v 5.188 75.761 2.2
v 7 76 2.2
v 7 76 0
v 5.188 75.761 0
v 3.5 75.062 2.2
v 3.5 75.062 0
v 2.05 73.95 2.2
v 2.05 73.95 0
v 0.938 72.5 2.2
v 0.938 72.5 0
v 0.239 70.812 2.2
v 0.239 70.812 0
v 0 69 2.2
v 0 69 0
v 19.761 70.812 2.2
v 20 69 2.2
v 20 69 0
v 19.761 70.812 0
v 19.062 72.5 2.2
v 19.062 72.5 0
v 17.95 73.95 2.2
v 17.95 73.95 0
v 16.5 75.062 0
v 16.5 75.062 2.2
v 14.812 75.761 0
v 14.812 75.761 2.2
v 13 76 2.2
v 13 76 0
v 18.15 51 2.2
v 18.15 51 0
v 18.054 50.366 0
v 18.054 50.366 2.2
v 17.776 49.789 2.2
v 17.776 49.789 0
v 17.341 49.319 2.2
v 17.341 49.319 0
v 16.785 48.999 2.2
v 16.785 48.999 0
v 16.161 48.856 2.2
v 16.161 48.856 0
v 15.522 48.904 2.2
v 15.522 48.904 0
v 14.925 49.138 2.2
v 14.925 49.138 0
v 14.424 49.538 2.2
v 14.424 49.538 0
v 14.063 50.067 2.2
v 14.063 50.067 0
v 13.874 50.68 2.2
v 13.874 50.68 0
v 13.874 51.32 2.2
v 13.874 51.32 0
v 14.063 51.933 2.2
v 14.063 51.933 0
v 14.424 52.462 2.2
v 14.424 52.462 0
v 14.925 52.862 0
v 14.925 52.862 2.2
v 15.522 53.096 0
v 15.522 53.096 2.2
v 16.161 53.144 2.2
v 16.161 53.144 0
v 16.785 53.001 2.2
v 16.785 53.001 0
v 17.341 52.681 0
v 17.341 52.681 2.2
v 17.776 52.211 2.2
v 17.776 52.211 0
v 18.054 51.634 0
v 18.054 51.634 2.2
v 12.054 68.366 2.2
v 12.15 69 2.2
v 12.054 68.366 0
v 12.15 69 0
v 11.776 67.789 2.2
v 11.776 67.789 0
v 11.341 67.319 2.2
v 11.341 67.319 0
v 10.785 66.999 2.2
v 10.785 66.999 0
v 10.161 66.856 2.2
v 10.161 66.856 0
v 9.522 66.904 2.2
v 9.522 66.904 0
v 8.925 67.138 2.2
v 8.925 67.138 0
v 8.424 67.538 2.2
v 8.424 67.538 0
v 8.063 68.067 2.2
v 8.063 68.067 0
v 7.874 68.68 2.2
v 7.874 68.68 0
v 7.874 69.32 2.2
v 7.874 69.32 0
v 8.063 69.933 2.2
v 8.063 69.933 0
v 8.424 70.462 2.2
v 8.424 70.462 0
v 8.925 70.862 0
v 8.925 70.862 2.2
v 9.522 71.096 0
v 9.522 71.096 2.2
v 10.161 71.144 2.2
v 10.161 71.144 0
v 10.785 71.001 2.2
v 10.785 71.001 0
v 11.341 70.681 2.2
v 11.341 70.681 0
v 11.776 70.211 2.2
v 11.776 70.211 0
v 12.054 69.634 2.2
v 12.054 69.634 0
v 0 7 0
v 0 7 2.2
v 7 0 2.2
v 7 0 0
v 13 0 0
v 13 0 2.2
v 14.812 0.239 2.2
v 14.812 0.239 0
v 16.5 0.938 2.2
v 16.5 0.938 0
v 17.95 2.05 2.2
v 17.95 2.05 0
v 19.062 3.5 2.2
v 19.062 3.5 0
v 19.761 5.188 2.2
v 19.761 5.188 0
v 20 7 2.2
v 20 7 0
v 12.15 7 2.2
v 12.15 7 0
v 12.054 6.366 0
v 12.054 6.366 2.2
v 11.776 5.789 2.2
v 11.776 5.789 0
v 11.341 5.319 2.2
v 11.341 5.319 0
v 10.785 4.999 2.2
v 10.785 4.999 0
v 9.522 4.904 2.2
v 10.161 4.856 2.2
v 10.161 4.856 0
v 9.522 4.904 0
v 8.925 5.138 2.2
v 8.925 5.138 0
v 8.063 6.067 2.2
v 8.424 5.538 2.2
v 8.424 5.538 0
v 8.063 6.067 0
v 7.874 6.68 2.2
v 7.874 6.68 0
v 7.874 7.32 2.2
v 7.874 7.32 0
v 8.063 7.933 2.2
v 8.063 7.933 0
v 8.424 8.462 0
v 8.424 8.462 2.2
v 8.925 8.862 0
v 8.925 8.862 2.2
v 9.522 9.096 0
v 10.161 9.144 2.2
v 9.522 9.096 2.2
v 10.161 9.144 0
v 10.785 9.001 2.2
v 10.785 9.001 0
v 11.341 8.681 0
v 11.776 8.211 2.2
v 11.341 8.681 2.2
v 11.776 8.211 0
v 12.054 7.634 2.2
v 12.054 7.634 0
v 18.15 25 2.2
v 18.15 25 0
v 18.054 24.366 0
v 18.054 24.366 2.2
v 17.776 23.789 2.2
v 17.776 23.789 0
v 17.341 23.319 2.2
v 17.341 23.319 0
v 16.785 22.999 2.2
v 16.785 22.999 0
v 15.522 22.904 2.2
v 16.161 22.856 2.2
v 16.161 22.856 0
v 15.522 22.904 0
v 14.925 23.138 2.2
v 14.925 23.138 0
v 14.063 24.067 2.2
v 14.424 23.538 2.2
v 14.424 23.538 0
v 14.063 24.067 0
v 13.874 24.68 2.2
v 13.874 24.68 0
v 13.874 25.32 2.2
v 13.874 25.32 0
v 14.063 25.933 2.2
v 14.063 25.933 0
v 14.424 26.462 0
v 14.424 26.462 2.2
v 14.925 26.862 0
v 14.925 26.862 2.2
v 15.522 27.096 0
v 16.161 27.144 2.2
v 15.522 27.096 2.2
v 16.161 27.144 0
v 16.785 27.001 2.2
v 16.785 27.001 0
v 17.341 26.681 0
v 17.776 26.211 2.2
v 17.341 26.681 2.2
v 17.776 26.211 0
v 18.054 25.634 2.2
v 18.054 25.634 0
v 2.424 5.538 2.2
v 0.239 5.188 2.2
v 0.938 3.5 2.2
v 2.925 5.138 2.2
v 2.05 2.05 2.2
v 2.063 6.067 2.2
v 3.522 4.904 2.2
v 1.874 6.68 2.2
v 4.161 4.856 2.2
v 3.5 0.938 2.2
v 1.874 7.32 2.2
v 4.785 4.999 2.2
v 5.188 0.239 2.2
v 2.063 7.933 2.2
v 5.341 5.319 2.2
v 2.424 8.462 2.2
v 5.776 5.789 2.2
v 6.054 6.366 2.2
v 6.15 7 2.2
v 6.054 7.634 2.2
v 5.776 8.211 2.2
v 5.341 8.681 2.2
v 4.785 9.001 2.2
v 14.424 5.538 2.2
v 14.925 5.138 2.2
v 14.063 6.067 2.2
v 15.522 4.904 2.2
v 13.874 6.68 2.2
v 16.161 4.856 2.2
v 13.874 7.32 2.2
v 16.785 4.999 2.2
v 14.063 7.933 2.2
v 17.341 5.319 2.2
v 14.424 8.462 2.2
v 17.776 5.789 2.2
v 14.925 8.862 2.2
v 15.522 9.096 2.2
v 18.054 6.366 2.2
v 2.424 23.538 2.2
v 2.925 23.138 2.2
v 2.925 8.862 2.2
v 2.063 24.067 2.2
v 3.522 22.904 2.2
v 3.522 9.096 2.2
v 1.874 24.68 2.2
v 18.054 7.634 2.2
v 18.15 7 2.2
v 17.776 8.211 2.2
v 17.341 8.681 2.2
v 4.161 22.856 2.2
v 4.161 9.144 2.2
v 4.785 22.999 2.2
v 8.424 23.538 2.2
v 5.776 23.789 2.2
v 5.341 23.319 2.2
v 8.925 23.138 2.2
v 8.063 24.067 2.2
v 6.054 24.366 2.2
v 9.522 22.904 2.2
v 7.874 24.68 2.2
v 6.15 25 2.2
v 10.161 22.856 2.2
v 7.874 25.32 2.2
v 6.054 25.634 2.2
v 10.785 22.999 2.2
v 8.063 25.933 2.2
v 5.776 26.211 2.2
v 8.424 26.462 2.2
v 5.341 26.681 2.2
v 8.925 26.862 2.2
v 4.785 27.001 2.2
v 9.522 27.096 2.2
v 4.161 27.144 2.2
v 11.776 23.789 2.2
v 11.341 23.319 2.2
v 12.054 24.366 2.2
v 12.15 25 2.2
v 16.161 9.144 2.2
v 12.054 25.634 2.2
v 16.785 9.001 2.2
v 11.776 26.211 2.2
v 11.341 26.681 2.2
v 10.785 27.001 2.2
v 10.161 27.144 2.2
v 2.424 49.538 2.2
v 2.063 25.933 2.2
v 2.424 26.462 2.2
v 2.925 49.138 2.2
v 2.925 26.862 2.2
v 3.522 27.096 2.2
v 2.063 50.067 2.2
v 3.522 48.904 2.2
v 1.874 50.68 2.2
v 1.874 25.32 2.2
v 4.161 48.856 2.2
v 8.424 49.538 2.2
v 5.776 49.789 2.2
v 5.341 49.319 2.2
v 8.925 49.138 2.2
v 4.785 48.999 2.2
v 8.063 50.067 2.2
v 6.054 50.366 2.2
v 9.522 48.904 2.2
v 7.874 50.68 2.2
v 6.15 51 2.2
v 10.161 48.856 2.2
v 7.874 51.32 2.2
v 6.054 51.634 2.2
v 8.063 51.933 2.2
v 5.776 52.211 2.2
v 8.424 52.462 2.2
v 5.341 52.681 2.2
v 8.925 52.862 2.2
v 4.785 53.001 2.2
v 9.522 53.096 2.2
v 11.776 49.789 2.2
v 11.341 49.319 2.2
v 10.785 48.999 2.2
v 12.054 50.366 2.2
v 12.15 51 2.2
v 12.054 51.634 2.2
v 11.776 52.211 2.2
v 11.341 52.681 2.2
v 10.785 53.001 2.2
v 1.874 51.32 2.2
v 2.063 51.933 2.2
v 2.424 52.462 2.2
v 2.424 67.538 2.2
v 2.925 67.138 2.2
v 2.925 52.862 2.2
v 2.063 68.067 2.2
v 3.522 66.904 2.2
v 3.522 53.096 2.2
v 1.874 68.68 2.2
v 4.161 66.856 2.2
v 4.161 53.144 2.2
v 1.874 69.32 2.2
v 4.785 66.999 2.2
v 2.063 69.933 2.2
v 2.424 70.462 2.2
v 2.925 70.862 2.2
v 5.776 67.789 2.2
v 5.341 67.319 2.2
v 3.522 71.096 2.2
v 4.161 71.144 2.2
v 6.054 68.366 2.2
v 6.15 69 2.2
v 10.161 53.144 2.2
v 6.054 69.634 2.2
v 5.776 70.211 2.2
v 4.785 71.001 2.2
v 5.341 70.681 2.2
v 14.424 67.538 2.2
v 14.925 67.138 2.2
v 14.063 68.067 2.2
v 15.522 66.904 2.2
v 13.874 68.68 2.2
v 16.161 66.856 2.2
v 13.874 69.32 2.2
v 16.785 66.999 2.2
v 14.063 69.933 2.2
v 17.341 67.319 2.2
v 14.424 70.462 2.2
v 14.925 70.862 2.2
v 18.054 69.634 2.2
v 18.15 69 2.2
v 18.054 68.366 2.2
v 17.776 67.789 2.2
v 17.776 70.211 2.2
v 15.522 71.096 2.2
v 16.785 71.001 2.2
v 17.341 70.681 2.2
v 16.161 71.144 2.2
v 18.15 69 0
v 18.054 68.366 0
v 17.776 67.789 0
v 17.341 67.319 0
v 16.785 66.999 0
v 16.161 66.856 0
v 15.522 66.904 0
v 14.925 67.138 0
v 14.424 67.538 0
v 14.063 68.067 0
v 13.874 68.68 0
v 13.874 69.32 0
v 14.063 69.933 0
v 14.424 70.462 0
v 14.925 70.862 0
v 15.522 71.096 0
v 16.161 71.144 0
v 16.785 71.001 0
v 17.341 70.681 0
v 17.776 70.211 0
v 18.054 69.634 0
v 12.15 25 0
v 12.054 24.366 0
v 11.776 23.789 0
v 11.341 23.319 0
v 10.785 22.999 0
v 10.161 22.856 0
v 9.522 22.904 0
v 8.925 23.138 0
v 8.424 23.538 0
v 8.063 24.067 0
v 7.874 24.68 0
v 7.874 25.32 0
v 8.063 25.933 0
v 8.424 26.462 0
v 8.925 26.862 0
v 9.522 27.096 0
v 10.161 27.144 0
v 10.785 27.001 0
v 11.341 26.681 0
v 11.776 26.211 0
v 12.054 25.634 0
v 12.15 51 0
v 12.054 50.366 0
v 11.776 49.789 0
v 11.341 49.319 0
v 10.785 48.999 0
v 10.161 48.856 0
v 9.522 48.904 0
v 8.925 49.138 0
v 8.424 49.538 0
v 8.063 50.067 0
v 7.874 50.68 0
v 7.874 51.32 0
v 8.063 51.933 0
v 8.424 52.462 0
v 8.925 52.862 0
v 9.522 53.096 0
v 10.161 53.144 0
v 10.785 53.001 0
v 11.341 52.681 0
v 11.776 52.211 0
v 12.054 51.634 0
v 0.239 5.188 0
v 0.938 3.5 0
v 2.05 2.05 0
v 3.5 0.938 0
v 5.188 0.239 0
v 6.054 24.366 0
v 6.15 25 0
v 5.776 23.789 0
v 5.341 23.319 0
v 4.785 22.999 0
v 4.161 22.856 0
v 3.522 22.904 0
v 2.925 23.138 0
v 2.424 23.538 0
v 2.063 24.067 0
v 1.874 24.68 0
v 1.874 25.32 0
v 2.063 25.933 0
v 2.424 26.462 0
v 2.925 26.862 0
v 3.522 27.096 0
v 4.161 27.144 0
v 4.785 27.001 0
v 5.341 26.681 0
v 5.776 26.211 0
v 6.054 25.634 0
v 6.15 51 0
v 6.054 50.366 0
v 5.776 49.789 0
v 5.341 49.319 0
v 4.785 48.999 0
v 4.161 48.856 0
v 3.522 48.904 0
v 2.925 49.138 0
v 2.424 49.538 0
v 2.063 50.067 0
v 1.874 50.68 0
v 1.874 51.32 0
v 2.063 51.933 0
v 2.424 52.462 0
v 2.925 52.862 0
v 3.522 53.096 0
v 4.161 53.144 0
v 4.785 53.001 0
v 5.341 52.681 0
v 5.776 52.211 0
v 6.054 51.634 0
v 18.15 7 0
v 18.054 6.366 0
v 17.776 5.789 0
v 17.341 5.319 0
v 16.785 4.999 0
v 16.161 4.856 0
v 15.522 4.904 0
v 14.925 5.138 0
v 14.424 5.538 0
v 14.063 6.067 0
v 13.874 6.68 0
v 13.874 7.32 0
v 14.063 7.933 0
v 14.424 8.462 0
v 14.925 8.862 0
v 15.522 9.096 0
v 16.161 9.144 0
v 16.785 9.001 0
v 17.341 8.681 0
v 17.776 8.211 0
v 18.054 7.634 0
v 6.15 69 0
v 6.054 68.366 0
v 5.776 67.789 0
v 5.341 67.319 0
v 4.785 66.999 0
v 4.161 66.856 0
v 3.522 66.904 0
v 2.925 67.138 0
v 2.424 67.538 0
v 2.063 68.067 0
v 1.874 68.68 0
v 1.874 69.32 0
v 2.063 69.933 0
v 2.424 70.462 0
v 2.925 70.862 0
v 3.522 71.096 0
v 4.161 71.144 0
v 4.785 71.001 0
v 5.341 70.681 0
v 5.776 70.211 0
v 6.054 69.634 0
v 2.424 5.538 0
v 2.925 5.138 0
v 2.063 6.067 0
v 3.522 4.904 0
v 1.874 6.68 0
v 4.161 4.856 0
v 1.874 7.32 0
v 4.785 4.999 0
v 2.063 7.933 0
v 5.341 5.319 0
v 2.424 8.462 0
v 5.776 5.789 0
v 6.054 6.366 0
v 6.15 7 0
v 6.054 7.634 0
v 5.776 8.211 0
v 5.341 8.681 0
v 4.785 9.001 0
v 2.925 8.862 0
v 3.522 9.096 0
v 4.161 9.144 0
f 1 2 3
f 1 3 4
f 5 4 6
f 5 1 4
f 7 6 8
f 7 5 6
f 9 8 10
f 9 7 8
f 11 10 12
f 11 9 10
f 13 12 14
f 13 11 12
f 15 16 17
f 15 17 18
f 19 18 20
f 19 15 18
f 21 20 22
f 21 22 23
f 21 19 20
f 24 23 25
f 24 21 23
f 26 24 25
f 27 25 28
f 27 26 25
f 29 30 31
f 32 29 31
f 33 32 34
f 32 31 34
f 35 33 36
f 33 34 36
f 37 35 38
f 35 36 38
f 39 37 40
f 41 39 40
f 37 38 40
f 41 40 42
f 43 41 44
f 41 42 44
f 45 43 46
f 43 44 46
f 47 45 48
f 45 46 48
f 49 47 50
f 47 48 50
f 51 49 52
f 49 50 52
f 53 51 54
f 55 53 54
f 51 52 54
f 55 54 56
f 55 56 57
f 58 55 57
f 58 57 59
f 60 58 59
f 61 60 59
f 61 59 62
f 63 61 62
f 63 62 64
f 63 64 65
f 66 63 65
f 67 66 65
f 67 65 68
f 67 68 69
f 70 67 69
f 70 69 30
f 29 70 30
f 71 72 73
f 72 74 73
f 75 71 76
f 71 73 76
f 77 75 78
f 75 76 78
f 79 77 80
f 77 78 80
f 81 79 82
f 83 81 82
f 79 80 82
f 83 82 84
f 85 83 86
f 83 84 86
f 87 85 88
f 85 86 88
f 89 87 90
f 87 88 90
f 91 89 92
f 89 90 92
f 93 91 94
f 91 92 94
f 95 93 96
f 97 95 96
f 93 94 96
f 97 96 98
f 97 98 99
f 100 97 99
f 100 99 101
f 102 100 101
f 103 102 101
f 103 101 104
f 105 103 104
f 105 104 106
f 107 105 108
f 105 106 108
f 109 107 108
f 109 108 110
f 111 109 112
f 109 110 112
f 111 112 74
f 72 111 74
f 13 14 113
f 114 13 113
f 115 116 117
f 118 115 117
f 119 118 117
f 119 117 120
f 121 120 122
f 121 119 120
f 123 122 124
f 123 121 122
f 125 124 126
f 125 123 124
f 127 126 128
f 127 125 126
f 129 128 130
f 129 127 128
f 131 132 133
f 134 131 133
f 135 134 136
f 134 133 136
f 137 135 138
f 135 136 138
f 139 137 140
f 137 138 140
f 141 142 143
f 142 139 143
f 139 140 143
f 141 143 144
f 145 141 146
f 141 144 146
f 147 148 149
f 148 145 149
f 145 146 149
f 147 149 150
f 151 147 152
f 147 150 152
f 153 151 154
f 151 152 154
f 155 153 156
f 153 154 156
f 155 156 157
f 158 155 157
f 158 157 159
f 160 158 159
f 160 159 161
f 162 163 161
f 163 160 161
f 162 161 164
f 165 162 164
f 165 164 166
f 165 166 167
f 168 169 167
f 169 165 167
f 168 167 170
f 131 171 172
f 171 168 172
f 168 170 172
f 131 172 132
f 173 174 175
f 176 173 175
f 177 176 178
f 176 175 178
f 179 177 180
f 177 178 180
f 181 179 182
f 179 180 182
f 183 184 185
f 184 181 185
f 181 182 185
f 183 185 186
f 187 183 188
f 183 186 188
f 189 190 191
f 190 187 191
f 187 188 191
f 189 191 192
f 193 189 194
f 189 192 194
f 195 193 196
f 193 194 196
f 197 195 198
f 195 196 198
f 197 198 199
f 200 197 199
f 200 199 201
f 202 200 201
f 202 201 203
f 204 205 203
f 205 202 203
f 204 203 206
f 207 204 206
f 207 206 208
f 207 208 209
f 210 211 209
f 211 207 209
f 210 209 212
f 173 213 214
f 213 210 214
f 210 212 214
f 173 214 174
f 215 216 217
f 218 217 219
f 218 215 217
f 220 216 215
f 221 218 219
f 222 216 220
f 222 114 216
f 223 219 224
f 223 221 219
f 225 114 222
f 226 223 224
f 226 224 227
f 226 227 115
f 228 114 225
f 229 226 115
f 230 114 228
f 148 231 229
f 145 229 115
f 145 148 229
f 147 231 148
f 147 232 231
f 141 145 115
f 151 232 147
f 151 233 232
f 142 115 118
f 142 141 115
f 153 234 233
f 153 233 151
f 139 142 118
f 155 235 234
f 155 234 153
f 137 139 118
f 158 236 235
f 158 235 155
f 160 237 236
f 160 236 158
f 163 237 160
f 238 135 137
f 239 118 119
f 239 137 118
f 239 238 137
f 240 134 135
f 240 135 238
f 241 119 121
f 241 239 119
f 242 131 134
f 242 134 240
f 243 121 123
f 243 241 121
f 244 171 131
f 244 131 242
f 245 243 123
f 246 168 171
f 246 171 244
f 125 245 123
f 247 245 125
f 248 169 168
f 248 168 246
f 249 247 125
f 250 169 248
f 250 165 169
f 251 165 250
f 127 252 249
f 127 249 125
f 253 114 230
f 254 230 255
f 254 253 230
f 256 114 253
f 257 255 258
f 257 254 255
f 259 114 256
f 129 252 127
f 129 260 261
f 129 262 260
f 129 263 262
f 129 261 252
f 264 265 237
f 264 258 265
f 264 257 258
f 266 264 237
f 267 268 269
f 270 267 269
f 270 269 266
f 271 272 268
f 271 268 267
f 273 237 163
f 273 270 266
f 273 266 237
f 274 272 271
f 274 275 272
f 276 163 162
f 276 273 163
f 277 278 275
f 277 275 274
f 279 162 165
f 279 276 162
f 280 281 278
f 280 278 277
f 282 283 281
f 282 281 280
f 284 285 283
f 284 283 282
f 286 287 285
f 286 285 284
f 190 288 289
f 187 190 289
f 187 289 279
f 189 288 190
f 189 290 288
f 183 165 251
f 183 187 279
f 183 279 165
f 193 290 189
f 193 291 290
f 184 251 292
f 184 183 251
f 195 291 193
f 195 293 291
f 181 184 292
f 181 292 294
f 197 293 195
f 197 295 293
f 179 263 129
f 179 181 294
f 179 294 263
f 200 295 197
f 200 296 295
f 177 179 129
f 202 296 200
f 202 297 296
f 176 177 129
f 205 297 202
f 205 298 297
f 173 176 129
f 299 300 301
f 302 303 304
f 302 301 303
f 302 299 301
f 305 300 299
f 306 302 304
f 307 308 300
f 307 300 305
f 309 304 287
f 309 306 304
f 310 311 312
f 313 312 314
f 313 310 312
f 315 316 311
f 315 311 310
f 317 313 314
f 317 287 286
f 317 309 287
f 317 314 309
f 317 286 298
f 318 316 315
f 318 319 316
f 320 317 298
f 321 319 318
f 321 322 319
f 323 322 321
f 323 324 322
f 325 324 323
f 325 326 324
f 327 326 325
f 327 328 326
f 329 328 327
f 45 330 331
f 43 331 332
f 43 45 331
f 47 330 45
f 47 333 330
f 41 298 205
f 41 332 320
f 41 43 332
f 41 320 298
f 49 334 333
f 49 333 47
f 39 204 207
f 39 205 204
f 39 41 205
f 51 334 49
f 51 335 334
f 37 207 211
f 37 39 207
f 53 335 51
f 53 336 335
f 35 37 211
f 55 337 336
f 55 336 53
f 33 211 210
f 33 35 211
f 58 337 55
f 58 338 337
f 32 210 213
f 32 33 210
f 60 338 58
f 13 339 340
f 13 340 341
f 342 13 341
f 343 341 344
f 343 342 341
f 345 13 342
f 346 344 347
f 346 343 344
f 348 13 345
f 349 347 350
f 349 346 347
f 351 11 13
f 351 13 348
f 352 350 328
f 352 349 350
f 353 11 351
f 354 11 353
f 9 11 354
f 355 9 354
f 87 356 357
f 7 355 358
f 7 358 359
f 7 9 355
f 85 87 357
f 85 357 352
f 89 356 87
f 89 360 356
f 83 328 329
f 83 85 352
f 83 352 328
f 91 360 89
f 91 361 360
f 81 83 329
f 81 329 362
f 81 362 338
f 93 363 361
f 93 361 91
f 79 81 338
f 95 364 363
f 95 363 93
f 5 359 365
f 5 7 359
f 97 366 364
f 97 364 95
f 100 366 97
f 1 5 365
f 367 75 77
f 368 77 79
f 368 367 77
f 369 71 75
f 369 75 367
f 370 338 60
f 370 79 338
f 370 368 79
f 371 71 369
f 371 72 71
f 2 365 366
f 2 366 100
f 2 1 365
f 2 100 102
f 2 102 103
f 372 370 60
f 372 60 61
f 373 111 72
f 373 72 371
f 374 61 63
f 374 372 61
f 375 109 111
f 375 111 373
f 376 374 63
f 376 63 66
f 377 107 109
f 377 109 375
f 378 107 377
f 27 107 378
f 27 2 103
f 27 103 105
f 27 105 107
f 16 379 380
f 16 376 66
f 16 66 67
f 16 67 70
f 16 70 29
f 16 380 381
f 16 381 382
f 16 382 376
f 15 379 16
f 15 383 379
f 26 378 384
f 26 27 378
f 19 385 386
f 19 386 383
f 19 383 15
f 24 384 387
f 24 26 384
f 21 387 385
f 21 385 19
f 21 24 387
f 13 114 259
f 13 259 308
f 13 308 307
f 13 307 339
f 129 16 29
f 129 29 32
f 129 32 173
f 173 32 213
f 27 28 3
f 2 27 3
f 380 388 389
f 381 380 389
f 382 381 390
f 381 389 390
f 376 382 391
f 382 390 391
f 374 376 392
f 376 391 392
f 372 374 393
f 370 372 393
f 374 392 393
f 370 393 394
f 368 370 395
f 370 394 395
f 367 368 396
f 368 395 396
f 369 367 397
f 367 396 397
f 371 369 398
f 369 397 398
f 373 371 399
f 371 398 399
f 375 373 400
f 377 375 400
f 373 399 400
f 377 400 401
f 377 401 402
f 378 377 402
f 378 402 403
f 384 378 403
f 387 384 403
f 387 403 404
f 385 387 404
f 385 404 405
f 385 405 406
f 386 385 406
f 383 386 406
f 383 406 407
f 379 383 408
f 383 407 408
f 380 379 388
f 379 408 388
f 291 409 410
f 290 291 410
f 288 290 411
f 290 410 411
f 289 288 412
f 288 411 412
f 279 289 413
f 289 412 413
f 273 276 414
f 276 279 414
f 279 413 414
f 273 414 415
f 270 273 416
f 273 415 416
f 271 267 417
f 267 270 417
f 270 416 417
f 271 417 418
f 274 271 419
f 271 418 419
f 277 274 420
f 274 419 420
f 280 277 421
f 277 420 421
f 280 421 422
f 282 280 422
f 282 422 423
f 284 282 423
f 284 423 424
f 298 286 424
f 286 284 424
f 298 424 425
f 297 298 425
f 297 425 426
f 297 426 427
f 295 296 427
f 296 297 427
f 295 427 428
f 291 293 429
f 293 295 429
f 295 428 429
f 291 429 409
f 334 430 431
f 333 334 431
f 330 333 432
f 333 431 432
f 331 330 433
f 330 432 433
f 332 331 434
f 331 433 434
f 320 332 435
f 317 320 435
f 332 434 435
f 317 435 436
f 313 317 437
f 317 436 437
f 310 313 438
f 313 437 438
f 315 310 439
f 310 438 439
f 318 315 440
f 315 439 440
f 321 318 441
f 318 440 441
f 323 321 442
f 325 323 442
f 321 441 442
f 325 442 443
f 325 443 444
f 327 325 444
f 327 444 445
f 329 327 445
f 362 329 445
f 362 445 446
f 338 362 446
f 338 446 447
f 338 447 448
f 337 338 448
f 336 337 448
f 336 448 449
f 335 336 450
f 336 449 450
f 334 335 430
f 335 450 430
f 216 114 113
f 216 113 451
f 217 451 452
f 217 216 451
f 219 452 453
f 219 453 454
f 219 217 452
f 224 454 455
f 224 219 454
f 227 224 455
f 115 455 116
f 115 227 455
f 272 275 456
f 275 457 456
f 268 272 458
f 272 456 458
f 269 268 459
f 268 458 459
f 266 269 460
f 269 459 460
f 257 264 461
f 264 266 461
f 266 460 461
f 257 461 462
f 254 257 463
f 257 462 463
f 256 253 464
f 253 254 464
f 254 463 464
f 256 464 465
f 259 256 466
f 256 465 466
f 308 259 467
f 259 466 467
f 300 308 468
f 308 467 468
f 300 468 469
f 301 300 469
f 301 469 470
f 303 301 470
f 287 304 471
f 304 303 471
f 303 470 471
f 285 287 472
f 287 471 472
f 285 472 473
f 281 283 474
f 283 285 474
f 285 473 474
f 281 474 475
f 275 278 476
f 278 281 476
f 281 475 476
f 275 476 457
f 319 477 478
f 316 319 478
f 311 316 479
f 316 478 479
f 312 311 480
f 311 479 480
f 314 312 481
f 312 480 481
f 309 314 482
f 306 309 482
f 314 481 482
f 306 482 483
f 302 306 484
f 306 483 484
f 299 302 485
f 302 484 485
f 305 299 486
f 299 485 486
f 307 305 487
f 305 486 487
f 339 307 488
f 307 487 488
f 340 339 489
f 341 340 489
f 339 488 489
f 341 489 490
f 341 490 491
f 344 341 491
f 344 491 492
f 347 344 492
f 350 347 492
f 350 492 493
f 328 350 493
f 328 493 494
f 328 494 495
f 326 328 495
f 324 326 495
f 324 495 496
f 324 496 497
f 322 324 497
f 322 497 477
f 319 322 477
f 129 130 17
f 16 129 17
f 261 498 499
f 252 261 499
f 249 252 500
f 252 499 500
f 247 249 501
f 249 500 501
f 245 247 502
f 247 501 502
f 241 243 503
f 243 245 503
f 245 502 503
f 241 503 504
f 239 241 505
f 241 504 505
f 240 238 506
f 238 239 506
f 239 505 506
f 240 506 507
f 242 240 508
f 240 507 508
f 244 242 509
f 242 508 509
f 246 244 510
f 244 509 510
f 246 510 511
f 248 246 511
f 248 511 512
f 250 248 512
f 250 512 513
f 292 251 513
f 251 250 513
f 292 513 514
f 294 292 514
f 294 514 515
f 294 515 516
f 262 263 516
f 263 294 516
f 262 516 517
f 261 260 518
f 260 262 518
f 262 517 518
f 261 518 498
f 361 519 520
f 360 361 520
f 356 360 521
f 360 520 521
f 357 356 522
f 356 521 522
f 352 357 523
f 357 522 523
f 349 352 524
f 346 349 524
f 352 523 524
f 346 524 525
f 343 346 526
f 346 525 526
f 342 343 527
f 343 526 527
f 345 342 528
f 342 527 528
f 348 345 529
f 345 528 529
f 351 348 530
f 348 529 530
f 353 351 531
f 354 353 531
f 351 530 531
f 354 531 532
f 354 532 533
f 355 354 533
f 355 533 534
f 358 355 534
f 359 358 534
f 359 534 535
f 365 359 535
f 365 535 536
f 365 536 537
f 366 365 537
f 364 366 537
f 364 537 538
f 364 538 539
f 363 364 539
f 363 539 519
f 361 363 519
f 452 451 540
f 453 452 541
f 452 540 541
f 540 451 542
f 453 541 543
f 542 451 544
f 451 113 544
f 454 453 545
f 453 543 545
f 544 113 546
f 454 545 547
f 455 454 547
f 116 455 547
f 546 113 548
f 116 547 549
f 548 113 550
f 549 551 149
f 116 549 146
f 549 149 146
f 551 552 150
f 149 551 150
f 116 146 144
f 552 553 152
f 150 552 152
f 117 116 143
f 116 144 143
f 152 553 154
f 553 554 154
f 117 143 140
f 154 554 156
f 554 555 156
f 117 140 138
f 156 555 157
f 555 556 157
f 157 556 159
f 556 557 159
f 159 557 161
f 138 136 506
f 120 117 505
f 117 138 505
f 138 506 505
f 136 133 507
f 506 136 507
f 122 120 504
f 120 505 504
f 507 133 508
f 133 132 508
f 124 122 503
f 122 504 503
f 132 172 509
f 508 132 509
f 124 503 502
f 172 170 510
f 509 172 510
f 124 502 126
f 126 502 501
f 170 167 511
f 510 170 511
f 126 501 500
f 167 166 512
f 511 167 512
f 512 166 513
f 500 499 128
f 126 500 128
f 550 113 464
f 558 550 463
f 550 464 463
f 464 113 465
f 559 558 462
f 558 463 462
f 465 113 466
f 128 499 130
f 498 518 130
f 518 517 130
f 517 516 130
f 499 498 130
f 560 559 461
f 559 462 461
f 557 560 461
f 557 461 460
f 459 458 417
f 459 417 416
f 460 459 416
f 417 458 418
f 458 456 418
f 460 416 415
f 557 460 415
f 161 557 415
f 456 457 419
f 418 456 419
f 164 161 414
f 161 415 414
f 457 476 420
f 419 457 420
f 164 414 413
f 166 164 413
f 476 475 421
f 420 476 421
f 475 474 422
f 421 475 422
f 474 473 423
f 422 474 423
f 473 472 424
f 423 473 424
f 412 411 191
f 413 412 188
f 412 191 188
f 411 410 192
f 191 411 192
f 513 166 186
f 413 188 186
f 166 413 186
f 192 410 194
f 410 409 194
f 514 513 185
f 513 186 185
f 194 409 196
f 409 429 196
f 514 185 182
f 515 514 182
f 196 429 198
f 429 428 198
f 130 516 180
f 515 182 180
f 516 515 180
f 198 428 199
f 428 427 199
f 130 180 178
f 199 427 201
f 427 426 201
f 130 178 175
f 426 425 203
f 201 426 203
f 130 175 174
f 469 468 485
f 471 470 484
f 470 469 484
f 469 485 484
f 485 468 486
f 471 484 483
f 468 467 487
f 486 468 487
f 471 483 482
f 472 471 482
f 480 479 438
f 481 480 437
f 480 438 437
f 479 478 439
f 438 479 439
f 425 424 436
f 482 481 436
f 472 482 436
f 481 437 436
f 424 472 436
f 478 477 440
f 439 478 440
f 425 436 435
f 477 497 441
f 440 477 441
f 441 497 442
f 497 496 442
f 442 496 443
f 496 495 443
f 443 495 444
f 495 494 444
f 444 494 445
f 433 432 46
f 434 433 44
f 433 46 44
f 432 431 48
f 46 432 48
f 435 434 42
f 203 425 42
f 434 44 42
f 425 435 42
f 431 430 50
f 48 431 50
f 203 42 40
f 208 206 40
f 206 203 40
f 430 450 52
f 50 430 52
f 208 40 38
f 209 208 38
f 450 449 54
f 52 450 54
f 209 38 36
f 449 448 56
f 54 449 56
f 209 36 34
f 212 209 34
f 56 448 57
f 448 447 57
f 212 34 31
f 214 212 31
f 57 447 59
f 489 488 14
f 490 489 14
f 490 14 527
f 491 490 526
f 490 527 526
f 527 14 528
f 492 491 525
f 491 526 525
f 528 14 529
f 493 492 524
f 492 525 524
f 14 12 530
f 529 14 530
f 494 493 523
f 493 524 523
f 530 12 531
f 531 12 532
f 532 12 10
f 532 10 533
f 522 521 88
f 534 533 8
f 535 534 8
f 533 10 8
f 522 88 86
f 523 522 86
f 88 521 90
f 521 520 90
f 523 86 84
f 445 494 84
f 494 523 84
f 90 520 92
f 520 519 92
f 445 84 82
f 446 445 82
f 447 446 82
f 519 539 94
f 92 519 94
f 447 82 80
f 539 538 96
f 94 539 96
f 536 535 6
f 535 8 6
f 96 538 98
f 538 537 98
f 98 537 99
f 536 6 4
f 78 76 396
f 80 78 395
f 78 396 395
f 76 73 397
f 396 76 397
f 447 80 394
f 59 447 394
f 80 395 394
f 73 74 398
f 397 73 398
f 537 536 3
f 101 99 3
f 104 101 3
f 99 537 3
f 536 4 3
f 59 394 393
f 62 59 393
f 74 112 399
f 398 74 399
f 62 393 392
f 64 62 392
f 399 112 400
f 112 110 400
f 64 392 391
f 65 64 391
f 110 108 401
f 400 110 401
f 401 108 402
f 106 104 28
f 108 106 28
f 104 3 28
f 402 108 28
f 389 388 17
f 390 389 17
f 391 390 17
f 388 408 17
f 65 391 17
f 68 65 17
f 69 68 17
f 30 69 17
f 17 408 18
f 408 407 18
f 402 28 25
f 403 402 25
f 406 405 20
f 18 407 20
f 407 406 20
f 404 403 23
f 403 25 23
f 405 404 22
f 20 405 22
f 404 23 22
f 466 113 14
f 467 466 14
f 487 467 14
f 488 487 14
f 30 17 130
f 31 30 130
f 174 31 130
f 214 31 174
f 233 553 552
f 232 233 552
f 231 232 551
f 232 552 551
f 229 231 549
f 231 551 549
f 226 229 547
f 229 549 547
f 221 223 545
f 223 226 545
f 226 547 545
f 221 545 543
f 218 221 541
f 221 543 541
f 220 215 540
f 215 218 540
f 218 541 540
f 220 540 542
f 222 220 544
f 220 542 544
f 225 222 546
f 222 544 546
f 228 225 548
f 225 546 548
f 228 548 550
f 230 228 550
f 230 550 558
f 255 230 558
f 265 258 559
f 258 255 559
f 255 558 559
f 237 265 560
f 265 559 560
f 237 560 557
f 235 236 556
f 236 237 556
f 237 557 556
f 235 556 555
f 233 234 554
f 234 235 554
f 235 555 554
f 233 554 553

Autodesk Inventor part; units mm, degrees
ref_plane "YZ Plane" through (0, 0, 0) normal (1, 0, 0) x (0, 1, 0)
ref_plane "XZ Plane" through (0, 0, 0) normal (0, 1, 0) x (-1, 0, 0)
ref_plane "XY Plane" through (0, 0, 0) normal (0, 0, 1) x (1, 0, 0)
sketch "Esquisse12" plane through (0, 0, 0) normal (0, 0, 1) x (1, 0, 0)
  line L0 (0, 0) -> (20, 0)
  line L1 (20, 0) -> (20, 38)
  line L2 (20, 38) -> (0, 38)
  line L3 (0, 38) -> (0, 0)
  line L4 (10, 38) -> (10, 0) construction
  circle A0 centre (10, 7) radius 2.15
  line L5 (10, 7) -> (20, 7) construction
  circle A1 centre (16, 7) radius 2.15
  circle A2 centre (4, 7) radius 2.15
  circle A3 centre (10, 7) radius 2.15
  circle A4 centre (10, 25) radius 2.15
  circle A5 centre (16, 25) radius 2.15
  circle A6 centre (4, 25) radius 2.15
  dimension "d133" = 20
  dimension "d134" = 7
  dimension "d135" = 4.3
  dimension "d138" = 6
  dimension "d141" = 6
  dimension "d148" = 18
  dimension "d153" = 13
extrude "Extrusion13" add sketch "Esquisse12" along normal blind 2.2
fillet "Congé8" radius 7 2 edges at (20, 0, 1.1) (0, 0, 1.1)
mirror "Symétrie3" about plane through (20, 38, 0) normal (0, 1, 0)
equation "\"d135\" = Holes"
equation "\"d154\" = Depth"
equation "\"d156\" = Rounding"
equation "\"Depth\" = 2.2"
equation "\"Holes\" = 4.3"
equation "\"Height\" = 0"
equation "\"Rounding\" = 7"
properties part number "SideToSide"
